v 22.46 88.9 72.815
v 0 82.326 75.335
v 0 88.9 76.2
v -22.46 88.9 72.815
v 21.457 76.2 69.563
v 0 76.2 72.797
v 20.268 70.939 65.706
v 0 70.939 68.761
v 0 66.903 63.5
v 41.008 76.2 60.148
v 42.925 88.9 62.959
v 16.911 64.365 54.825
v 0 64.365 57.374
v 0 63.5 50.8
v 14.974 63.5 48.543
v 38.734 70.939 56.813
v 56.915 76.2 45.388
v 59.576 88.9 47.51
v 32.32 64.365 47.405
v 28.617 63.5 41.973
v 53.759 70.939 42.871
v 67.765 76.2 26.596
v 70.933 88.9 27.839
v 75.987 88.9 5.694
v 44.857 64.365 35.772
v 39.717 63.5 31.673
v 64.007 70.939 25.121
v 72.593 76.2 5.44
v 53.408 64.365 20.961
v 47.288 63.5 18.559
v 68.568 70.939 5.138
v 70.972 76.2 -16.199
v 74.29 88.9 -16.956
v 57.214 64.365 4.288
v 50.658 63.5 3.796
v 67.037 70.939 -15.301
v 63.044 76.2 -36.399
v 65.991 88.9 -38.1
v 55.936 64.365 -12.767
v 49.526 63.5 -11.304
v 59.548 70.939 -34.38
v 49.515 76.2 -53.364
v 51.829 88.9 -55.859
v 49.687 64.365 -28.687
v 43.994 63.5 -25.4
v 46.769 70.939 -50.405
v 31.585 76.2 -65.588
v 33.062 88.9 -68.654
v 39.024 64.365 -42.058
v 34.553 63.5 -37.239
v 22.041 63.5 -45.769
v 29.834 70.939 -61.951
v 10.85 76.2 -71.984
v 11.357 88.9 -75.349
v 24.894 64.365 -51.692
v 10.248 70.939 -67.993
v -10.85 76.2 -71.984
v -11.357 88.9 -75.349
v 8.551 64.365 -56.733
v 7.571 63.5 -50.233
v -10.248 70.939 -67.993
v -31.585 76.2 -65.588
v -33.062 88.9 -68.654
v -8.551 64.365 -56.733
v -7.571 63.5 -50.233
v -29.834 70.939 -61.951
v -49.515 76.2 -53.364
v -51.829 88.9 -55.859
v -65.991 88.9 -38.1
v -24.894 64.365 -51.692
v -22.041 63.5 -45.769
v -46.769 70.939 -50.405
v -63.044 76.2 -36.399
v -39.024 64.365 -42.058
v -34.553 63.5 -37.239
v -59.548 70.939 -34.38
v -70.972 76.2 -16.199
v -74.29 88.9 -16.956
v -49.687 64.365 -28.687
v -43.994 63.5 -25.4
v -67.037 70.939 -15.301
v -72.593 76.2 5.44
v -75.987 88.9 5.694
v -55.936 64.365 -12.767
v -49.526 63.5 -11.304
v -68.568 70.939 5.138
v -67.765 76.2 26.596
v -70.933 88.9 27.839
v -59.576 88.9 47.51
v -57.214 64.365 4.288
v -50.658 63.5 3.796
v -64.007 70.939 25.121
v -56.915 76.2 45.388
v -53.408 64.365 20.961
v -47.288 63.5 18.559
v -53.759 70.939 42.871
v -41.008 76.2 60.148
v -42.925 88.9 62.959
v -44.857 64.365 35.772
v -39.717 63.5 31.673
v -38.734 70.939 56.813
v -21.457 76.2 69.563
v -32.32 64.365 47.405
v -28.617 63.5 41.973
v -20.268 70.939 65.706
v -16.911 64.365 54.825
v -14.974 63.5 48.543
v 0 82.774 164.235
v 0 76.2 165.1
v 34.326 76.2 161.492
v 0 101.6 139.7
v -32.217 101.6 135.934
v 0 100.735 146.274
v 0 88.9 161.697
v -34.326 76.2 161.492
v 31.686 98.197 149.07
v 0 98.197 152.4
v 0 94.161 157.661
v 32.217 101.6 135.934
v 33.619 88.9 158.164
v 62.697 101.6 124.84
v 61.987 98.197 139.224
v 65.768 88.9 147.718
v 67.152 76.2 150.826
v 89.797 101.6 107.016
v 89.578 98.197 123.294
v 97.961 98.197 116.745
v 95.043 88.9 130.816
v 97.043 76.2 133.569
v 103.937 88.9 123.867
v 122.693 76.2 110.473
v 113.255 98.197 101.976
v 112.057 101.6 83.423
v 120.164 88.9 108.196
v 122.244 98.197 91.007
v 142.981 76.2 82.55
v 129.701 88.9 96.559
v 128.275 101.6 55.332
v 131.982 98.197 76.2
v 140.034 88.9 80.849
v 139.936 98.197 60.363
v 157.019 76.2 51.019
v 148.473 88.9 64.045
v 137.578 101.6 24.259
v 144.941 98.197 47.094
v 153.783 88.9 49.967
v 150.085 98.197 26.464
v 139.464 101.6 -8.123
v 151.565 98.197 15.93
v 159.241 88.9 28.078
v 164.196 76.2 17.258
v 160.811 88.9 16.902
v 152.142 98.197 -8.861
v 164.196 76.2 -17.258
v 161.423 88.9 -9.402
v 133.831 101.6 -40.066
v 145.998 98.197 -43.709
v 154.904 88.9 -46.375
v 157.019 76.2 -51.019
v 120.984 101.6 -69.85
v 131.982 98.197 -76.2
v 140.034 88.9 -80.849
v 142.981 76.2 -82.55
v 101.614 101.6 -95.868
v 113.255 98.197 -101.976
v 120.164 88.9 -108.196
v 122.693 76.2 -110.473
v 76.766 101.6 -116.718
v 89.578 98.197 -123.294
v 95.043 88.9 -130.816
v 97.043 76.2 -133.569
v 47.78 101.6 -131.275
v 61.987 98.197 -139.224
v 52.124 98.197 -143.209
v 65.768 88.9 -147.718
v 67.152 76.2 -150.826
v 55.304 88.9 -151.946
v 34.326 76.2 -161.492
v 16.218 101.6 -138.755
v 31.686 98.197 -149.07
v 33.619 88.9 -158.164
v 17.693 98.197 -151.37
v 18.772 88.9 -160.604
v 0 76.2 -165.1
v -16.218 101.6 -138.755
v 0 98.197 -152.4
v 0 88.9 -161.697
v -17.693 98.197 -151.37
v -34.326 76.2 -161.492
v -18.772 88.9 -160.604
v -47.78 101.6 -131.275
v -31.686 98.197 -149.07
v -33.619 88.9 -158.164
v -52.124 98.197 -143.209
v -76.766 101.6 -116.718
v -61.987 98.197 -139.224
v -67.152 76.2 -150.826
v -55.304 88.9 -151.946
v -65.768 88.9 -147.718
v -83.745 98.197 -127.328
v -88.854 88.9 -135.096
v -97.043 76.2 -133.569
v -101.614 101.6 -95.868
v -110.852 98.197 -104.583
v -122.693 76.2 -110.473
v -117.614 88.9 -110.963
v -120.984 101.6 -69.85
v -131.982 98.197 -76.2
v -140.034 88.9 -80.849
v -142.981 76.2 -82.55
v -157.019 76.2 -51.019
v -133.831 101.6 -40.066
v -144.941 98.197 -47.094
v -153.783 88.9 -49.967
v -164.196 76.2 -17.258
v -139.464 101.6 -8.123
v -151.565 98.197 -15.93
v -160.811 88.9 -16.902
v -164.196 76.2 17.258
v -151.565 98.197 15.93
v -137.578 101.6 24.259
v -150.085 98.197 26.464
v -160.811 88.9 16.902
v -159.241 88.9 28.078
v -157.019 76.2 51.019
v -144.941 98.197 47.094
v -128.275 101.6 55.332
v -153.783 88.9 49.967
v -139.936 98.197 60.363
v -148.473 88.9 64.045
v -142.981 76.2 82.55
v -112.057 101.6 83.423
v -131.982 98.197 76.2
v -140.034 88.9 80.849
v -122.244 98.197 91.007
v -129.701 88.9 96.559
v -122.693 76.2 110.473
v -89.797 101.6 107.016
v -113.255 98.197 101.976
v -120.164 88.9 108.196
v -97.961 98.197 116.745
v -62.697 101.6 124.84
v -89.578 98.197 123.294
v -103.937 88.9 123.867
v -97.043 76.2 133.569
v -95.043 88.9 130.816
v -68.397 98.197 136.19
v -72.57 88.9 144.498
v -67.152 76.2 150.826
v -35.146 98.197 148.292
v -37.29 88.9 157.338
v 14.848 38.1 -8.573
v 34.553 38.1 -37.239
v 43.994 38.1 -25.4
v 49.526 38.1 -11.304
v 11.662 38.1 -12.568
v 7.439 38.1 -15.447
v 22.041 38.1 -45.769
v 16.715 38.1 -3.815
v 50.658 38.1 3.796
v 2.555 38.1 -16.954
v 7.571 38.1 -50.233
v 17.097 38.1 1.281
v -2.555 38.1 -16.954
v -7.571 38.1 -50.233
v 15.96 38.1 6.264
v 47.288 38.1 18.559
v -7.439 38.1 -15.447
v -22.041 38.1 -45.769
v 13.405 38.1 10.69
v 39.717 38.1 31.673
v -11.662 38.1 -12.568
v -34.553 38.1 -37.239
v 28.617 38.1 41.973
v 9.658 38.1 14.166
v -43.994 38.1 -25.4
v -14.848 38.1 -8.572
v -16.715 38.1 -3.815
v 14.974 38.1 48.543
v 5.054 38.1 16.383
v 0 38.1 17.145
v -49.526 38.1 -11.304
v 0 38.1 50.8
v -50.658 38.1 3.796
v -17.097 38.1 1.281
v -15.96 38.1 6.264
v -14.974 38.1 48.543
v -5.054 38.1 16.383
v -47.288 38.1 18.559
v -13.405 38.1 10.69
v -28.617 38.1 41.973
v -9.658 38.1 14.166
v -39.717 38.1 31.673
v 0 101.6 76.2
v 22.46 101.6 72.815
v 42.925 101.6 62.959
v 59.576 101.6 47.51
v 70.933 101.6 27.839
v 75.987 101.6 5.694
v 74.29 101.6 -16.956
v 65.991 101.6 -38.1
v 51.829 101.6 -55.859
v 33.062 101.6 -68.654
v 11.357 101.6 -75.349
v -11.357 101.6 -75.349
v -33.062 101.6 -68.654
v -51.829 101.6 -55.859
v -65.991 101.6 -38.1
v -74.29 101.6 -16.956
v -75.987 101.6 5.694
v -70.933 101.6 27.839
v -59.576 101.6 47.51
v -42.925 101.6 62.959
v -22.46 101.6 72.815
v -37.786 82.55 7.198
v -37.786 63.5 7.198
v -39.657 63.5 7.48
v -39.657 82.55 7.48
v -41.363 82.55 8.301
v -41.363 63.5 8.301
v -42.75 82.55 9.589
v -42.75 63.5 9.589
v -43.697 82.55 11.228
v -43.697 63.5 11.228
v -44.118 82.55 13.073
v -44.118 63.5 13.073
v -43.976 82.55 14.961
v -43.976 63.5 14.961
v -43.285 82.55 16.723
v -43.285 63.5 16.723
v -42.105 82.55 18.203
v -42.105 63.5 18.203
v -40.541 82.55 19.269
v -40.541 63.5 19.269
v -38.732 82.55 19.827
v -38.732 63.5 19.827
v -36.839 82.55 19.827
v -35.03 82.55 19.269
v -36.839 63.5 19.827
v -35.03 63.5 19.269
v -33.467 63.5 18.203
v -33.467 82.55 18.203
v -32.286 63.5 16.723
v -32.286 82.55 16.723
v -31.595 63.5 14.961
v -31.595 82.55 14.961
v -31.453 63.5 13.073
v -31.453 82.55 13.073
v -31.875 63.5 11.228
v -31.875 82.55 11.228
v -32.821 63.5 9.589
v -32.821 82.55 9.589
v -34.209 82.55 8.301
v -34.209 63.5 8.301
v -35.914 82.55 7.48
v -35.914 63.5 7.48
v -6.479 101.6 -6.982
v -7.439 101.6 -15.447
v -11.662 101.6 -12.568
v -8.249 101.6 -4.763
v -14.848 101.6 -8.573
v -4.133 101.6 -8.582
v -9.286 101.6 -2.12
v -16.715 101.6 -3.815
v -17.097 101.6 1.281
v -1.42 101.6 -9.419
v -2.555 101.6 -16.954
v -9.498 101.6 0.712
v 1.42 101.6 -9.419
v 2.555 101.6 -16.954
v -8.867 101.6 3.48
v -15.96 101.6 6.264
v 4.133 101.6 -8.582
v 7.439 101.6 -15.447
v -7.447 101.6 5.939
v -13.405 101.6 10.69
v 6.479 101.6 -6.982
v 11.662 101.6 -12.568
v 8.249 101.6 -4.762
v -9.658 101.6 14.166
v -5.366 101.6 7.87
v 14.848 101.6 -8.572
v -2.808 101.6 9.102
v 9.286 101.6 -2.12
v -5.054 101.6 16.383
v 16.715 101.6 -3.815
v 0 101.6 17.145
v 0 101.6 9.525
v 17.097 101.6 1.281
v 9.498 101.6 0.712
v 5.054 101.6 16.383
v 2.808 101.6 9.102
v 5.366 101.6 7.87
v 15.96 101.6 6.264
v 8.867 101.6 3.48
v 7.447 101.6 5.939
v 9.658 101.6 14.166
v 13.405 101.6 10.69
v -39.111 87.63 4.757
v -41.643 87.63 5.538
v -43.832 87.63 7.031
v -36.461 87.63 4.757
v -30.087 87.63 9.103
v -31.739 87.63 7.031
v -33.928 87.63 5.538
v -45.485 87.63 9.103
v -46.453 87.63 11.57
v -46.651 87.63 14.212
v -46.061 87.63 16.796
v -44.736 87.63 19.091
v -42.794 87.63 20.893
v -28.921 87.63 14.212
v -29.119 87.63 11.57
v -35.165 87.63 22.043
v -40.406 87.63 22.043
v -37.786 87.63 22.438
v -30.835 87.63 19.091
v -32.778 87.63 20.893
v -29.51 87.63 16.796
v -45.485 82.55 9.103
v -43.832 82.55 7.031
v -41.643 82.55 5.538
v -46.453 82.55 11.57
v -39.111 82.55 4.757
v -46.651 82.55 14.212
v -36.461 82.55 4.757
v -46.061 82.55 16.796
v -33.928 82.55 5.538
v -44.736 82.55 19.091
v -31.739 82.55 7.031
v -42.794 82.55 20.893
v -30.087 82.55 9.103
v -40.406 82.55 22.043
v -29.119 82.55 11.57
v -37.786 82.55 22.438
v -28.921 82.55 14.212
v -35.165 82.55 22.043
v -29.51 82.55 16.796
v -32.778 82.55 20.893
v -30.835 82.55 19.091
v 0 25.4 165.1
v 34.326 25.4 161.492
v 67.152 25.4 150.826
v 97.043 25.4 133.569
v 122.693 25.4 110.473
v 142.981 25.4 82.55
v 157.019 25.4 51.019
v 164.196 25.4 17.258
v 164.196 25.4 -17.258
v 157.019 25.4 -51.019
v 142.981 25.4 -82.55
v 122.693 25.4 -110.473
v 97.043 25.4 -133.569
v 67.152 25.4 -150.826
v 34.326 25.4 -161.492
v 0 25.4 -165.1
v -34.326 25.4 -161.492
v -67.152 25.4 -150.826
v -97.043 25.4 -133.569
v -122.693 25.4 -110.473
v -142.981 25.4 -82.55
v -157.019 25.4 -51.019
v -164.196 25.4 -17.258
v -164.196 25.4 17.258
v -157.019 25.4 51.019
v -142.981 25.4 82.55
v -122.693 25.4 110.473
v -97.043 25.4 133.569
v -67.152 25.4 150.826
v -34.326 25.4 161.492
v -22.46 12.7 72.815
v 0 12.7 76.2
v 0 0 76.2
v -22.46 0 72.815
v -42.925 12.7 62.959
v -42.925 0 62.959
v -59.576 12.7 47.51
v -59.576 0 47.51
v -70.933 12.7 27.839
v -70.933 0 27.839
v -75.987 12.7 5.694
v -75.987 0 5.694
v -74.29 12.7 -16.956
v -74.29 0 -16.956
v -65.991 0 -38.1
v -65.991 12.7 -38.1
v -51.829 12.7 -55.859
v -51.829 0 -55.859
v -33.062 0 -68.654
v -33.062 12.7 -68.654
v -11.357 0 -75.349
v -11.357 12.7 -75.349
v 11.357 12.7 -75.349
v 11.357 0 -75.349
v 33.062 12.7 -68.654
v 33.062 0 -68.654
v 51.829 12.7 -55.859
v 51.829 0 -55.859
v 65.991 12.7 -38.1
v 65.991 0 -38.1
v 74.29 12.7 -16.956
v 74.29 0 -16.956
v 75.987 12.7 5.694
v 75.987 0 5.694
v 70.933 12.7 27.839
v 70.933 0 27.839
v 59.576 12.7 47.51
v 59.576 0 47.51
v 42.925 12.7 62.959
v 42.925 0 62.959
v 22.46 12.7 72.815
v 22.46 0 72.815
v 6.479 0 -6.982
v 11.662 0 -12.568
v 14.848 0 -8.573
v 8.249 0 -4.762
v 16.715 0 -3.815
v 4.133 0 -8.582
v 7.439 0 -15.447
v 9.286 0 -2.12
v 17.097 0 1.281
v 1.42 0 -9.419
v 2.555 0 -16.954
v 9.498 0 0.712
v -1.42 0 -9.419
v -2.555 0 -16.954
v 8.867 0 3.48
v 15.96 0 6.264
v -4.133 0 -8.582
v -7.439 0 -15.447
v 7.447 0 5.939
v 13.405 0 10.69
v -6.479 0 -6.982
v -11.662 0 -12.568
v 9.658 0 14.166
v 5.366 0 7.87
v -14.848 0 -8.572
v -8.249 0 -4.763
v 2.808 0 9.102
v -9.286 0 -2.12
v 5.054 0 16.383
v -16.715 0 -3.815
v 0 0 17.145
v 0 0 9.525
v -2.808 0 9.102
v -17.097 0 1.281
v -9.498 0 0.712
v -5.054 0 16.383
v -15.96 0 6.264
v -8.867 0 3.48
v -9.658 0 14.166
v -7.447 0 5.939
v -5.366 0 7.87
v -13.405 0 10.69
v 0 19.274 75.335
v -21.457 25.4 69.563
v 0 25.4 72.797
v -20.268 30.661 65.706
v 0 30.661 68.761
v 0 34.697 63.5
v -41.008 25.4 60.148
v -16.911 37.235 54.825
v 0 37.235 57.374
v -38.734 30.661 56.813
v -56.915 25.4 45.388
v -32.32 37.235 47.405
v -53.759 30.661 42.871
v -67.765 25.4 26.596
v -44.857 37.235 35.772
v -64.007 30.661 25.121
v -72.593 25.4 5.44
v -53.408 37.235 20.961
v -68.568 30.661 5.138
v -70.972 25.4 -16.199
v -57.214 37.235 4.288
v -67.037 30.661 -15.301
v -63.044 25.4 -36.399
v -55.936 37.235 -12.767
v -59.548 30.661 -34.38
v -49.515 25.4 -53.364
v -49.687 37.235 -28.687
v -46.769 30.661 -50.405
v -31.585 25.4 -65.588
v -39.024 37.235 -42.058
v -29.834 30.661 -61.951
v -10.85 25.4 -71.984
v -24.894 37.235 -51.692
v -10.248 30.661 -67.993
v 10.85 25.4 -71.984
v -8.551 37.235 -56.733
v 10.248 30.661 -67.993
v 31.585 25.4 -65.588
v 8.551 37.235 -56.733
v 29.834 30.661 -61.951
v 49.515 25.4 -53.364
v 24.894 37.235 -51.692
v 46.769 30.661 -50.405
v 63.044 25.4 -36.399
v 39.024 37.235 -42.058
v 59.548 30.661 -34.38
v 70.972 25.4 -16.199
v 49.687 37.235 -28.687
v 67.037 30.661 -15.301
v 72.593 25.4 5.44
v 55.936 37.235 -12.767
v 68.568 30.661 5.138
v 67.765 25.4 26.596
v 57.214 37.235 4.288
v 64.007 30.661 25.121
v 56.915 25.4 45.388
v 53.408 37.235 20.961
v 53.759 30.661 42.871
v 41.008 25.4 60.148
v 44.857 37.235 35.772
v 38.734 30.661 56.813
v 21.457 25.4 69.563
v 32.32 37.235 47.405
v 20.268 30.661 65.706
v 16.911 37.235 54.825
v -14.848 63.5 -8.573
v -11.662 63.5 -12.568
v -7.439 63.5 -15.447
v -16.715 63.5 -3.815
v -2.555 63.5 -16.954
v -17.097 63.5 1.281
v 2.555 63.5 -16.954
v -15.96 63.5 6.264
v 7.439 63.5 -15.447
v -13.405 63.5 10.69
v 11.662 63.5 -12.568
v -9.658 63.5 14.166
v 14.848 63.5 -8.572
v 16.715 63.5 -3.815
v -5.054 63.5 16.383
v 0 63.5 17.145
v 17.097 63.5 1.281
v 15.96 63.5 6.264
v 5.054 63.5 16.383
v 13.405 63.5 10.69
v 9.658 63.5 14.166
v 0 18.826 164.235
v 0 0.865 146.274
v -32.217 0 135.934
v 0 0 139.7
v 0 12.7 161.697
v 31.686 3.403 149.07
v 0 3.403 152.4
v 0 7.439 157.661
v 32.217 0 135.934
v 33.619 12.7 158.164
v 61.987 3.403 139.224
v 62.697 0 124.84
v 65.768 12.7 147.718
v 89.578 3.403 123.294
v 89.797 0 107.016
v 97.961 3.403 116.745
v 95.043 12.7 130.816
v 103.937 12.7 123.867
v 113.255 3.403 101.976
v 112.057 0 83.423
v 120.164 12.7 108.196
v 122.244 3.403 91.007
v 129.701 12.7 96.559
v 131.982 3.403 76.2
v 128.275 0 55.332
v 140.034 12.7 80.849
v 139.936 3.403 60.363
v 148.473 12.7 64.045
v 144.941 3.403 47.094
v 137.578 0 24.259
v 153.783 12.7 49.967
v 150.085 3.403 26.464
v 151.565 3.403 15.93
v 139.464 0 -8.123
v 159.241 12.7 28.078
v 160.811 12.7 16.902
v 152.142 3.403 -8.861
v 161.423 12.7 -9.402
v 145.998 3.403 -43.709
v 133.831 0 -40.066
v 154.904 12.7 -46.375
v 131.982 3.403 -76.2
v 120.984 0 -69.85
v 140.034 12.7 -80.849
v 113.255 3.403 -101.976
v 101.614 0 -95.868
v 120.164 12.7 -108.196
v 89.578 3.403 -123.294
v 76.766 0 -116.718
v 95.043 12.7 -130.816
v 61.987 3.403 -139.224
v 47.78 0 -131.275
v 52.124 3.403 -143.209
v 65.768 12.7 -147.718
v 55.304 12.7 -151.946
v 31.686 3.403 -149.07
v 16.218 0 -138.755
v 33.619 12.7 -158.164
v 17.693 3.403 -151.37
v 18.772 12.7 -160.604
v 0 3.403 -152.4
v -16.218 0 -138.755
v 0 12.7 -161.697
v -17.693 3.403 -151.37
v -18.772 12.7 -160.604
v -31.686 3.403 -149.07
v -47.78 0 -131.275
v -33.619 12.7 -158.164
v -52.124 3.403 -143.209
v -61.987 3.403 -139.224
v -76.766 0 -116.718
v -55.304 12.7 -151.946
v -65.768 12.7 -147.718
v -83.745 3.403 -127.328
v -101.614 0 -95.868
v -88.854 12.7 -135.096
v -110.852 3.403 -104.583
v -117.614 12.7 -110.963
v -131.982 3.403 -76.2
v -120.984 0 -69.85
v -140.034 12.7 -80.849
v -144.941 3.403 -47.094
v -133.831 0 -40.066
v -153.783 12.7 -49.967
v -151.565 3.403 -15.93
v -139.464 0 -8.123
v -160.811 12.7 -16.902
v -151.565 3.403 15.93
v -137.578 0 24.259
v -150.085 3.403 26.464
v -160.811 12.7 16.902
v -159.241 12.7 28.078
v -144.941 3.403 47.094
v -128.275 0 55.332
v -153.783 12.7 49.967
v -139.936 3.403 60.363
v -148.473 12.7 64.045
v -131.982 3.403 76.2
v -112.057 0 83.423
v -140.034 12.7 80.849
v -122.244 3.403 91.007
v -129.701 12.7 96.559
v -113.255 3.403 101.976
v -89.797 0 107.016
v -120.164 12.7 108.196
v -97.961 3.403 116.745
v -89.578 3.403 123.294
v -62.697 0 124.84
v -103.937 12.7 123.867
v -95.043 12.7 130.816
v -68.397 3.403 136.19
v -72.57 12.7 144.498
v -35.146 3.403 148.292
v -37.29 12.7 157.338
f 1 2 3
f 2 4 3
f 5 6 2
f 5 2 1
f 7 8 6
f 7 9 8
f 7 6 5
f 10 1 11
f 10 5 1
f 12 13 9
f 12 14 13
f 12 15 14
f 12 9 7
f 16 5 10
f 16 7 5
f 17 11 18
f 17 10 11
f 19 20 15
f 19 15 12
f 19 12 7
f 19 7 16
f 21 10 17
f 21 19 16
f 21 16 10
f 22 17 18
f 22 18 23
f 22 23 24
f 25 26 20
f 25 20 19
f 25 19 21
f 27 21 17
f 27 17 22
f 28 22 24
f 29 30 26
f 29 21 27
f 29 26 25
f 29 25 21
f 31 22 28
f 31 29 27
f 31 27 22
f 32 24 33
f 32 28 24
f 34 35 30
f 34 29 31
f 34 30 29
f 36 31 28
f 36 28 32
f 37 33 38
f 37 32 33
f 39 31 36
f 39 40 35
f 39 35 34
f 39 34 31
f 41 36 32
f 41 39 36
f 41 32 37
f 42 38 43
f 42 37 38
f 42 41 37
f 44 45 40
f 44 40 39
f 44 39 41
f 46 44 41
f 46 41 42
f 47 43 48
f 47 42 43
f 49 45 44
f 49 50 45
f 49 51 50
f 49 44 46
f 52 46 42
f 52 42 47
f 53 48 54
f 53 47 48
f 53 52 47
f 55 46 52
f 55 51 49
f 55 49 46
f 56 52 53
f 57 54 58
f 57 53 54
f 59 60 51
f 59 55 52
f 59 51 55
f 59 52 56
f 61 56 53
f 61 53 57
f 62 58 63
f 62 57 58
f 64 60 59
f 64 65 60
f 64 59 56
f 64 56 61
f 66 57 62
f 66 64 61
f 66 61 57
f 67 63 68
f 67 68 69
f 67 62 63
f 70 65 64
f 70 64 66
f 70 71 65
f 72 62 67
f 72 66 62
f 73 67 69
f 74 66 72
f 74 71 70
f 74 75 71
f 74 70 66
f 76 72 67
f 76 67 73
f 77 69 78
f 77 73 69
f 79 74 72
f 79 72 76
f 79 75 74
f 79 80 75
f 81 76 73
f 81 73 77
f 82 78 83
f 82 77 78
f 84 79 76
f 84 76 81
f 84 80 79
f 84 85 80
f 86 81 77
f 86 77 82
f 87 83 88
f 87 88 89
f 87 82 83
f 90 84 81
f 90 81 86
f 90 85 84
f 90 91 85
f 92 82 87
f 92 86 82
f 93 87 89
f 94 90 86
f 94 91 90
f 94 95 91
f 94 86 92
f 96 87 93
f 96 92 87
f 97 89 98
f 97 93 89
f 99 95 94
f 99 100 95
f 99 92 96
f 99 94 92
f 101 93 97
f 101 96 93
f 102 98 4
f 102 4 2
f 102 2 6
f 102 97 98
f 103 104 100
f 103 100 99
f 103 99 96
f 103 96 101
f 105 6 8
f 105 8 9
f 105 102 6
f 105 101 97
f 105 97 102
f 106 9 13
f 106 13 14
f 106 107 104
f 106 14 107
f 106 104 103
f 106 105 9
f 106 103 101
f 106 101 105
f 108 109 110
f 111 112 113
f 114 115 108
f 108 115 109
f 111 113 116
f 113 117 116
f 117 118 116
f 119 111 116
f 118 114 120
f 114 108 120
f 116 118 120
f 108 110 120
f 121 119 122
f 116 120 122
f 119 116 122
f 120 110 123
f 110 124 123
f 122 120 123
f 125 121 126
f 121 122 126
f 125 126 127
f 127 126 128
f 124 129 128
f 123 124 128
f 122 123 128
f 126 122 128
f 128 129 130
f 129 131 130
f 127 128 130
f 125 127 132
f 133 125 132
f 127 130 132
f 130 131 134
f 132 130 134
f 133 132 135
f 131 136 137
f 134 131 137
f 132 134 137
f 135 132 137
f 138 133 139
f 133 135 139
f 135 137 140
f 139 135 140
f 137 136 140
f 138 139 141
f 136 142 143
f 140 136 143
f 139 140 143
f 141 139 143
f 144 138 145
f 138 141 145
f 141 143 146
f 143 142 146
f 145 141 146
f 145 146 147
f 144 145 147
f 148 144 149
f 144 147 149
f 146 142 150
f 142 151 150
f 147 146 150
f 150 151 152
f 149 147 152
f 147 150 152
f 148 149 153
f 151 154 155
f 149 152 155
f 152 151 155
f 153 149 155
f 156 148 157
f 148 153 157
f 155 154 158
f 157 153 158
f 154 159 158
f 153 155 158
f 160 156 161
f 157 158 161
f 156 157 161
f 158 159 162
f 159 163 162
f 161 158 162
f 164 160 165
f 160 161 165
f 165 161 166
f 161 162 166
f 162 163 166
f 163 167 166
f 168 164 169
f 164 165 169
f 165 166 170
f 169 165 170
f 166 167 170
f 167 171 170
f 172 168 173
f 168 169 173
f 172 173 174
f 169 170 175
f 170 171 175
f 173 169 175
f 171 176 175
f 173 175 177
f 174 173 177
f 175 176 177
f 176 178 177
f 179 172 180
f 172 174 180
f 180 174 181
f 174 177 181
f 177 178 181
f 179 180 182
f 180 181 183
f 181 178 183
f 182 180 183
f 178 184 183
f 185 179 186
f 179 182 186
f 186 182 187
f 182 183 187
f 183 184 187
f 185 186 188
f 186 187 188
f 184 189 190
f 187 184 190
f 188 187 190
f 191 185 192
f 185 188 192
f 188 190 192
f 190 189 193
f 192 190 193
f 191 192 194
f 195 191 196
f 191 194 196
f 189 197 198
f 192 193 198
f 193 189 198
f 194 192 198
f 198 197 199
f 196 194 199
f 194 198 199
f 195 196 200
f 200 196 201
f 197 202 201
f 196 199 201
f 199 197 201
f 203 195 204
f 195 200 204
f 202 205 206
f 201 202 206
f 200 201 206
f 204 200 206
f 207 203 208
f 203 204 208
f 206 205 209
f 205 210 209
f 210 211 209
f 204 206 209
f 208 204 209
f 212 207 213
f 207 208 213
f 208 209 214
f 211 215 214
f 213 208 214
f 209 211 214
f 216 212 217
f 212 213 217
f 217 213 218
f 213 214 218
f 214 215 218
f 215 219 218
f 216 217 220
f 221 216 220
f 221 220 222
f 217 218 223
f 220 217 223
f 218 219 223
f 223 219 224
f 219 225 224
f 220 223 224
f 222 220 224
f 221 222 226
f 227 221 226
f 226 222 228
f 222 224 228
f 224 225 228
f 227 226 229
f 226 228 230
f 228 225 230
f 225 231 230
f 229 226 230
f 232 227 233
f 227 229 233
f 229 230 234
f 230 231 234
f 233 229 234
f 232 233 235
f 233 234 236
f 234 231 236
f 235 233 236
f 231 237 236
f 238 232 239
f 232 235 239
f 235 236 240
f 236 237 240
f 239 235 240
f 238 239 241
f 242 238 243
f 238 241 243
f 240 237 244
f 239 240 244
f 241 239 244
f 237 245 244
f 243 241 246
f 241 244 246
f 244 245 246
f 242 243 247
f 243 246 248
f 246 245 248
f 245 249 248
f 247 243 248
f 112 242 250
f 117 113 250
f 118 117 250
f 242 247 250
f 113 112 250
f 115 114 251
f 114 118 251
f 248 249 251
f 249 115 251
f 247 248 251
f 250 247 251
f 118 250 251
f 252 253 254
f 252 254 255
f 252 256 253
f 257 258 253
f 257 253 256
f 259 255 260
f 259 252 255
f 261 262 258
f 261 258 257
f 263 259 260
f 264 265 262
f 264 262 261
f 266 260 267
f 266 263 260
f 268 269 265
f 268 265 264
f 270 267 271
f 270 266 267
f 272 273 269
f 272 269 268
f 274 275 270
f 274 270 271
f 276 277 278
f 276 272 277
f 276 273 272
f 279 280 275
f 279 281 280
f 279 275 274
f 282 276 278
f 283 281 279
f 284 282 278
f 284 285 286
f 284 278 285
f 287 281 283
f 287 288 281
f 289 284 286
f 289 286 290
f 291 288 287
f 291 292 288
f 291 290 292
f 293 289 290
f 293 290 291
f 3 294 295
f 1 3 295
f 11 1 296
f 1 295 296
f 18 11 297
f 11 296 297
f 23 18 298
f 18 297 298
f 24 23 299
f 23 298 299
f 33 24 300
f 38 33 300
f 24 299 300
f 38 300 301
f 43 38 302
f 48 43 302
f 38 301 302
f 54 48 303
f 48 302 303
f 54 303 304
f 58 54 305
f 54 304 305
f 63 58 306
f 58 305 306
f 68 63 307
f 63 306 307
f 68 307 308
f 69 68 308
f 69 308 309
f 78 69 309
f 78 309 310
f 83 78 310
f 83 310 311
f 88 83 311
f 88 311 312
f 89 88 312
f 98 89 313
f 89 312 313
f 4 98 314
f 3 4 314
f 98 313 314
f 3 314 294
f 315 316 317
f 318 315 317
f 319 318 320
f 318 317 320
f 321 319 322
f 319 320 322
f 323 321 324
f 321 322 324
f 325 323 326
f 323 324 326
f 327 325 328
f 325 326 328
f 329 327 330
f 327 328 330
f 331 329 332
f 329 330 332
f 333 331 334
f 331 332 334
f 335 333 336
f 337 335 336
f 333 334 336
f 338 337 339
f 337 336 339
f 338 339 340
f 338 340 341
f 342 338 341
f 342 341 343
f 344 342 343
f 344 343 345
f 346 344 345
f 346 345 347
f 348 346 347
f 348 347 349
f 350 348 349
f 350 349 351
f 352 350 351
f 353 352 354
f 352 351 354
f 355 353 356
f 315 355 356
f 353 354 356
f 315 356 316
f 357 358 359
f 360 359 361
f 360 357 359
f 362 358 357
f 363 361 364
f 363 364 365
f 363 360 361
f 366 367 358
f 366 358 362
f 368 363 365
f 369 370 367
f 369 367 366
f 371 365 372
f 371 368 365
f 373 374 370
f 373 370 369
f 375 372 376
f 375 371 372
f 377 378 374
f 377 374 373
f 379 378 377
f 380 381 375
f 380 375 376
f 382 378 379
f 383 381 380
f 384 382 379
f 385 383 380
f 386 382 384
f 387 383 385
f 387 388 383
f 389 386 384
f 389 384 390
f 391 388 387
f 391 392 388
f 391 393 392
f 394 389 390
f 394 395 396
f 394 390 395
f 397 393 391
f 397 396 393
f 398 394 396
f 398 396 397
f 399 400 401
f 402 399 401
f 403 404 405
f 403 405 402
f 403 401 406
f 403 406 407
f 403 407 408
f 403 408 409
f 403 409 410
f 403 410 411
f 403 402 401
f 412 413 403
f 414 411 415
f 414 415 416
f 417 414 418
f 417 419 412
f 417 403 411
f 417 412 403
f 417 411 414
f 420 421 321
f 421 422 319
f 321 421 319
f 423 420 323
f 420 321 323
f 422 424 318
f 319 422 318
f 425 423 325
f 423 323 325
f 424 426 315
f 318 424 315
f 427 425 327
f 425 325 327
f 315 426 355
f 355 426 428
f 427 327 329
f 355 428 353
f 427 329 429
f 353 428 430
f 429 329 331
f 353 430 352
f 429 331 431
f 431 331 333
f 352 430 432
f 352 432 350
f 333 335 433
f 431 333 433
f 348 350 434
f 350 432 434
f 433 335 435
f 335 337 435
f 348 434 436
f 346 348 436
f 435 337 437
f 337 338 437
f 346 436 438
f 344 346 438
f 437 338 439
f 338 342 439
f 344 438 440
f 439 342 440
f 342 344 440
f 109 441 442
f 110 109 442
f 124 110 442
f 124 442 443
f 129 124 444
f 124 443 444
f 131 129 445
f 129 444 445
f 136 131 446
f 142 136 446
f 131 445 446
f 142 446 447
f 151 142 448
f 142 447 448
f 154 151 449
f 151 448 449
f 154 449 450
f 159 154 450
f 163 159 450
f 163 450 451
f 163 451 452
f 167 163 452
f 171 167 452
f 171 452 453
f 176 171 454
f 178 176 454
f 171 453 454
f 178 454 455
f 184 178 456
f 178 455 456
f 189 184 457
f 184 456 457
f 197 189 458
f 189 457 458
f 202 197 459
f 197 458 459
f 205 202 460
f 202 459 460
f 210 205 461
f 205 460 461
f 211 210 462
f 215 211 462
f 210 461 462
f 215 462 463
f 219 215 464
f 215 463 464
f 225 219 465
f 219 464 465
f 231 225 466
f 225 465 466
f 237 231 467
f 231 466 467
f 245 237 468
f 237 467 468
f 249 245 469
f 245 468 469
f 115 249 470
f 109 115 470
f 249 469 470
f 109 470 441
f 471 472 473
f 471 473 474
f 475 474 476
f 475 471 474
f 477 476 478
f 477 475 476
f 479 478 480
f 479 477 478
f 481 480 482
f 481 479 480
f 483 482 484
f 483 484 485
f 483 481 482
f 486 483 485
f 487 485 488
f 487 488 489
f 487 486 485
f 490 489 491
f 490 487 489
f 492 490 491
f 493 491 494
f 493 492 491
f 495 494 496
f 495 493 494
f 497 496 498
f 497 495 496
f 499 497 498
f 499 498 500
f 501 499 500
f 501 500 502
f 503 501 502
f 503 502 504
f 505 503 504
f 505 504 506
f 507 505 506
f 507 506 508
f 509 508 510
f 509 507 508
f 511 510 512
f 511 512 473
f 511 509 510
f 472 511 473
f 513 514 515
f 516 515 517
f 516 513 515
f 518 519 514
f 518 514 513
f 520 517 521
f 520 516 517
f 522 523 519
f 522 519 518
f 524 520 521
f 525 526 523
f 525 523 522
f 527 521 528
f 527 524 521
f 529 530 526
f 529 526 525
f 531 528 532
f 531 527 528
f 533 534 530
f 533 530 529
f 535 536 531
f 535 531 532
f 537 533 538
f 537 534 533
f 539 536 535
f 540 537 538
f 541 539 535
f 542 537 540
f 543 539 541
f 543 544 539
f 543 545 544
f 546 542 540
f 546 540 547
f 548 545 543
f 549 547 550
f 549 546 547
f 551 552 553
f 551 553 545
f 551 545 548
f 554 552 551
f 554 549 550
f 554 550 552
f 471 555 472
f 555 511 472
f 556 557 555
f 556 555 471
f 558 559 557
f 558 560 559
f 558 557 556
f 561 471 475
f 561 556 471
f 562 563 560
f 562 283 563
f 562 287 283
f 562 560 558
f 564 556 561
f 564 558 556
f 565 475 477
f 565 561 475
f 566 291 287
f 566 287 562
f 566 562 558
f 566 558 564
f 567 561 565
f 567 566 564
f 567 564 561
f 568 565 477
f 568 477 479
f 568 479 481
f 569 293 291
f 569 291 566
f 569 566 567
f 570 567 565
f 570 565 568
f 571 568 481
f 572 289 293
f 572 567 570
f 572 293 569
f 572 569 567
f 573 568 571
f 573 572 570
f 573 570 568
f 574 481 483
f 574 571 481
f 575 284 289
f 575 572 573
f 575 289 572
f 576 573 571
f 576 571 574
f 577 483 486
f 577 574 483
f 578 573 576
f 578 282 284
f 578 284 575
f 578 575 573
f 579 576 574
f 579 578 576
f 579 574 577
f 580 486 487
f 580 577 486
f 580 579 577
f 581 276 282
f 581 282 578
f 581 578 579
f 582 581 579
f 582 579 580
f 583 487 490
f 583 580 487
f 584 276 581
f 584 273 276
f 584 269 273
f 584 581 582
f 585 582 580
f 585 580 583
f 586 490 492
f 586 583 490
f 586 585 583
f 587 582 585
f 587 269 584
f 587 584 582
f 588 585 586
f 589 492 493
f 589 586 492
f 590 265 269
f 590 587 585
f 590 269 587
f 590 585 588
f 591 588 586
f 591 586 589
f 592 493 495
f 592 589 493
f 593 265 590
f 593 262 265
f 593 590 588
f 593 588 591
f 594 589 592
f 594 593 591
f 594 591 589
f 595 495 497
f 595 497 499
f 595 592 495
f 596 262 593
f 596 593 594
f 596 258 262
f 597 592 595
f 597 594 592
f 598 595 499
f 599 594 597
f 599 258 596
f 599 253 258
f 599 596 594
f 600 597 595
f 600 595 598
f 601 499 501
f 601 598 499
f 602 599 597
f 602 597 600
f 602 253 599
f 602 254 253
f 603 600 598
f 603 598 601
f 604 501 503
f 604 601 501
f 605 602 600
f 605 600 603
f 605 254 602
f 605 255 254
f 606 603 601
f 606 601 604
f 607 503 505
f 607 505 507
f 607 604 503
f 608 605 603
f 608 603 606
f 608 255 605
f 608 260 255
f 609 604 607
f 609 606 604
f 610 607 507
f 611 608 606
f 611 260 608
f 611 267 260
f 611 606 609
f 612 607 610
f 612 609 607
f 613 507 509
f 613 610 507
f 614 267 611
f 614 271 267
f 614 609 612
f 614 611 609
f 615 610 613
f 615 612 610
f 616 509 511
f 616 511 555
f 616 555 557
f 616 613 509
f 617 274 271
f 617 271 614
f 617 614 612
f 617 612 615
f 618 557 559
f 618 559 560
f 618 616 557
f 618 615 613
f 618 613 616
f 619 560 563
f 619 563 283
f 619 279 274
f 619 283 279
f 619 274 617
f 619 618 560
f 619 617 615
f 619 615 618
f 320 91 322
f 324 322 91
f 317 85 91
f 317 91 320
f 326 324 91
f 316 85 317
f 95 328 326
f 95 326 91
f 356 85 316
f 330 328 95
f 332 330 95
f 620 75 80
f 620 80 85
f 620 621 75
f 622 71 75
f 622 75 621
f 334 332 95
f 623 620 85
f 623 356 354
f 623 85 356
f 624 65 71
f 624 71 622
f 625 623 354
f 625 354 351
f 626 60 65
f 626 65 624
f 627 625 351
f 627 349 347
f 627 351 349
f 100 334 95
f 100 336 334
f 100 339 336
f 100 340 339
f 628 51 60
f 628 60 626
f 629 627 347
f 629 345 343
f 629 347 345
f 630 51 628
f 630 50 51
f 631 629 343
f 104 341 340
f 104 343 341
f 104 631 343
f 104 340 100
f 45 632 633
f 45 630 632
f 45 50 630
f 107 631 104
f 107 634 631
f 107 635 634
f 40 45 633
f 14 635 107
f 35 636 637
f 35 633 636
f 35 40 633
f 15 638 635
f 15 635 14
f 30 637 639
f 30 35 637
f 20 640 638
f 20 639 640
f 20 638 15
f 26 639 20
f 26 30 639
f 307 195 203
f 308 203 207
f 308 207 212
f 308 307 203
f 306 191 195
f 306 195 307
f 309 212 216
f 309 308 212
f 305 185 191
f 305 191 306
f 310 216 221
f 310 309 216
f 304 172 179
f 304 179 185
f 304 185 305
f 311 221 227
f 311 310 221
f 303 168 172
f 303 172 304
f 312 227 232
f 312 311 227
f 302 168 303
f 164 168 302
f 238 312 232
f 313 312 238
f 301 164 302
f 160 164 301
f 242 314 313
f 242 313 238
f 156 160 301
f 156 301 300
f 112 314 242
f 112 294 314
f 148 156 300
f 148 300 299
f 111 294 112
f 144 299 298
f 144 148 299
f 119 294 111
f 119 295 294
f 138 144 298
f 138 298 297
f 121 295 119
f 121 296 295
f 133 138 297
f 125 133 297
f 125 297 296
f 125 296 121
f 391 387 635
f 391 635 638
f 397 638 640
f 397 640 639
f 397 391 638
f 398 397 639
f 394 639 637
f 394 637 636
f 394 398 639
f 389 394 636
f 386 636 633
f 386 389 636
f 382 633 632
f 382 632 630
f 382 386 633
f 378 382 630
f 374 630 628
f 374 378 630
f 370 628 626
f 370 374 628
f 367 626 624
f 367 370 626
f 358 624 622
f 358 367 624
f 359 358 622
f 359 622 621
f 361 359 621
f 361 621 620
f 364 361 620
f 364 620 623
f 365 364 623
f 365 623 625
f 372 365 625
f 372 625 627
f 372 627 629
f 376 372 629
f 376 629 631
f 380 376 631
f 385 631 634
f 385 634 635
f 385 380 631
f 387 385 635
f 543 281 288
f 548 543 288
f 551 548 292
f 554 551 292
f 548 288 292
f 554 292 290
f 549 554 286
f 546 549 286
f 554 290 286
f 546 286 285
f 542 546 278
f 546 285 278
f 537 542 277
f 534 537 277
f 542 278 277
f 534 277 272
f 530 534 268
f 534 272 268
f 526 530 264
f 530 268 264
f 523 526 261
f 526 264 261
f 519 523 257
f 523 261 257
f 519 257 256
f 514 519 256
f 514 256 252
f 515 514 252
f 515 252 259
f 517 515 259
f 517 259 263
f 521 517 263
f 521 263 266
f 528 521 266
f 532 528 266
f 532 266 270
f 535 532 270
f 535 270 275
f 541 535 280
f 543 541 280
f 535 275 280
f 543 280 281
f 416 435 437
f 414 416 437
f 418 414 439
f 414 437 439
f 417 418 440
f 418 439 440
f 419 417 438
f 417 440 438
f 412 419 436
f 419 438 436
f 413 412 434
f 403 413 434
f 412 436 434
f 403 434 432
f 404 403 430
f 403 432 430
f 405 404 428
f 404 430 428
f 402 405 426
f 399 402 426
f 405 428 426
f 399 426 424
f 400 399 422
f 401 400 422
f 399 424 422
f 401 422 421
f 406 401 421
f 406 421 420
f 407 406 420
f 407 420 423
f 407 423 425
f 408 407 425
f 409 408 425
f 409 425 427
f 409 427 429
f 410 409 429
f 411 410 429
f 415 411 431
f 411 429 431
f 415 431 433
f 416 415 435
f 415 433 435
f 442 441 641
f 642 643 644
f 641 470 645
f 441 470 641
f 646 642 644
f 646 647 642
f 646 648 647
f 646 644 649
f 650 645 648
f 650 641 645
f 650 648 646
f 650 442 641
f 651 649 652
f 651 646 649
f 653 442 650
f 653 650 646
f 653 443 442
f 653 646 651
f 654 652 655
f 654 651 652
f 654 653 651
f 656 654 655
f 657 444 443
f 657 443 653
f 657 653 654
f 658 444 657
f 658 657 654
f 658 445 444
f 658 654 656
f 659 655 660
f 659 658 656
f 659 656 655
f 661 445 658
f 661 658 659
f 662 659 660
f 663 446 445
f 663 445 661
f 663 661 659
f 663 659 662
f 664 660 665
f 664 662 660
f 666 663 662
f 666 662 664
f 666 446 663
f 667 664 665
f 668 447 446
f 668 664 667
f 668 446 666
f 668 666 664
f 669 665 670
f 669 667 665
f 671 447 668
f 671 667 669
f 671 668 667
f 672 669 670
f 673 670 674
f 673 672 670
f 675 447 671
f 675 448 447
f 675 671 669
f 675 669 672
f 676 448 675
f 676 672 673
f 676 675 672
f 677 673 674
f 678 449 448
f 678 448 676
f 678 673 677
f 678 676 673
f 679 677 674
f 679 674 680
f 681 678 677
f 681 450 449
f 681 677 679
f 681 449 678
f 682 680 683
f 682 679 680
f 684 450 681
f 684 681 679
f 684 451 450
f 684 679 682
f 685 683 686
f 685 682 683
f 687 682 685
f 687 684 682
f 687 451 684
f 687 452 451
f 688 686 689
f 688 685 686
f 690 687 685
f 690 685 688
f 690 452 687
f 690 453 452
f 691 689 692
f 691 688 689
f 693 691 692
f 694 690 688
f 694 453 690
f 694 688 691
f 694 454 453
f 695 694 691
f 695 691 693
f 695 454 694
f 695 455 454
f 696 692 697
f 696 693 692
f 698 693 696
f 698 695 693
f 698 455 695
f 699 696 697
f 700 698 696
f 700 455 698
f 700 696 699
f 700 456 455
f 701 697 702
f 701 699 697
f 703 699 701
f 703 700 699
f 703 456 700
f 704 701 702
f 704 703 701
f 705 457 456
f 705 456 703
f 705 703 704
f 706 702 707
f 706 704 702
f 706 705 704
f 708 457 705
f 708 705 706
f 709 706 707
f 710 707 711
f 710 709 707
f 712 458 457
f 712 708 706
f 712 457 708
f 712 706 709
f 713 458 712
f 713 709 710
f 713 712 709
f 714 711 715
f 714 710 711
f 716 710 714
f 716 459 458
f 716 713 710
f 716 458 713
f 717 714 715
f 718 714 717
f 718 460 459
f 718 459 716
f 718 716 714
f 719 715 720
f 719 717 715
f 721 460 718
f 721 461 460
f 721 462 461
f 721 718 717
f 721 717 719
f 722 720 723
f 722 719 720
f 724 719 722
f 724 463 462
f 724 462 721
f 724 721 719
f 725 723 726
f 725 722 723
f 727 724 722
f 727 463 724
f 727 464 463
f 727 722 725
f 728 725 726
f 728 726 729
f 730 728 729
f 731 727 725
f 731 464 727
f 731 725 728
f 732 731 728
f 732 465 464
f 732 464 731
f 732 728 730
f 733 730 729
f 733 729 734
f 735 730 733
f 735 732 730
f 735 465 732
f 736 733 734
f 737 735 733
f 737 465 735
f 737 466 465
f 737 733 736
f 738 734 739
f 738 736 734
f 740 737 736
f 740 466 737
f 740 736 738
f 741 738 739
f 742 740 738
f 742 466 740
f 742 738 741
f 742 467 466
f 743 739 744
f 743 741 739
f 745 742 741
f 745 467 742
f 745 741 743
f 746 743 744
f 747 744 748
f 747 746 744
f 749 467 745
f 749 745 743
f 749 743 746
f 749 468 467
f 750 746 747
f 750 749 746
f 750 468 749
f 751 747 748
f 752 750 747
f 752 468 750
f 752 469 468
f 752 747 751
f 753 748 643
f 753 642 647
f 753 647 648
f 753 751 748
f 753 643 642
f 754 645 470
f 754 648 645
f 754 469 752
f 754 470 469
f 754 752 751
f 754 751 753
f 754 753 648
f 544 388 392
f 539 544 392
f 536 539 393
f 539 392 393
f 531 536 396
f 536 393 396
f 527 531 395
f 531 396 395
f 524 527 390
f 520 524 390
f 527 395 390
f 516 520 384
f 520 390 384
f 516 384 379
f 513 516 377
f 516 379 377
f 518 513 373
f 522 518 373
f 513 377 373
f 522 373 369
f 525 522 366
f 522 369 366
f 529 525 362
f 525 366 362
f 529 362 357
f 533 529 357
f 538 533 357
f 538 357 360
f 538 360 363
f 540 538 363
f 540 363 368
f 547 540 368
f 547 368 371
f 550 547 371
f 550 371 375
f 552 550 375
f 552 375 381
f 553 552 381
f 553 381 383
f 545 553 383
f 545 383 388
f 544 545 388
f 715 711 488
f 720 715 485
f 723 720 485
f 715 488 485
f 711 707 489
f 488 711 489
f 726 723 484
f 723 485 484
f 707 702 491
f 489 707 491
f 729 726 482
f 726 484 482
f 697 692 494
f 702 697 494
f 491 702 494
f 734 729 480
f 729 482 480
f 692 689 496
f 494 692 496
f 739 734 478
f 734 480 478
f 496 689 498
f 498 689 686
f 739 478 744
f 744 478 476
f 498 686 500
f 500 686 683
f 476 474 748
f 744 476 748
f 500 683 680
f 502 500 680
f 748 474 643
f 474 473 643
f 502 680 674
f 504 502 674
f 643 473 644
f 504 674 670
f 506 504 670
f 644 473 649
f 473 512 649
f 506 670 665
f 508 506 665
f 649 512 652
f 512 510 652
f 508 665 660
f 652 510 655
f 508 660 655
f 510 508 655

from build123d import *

# Parameters (mm, degrees)
SKETCH1_R           = 165.1
BOSS_EXTRUDE2_DEPTH = 101.6
SKETCH2_R           = 76.2
CUT_EXTRUDE1_DEPTH  = 38.1
FILLET3_R           = 25.4
FILLET4_R           = 25.4
CUT_EXTRUDE2_START  = -38.1
SKETCH3_R           = 76.2
CUT_EXTRUDE2_DEPTH  = 38.1
FILLET5_R           = 25.4
FILLET6_R           = 25.4
SKETCH4_R           = 17.145
BOSS_EXTRUDE3_DEPTH = 38.1
BOSS_EXTRUDE4_START = 38.1
SKETCH5_R           = 17.145
BOSS_EXTRUDE4_DEPTH = 38.1
SKETCH6_R           = 9.525
CUT_EXTRUDE3_DEPTH  = 255.634208358
SKETCH7_R           = 6.35
BOSS_EXTRUDE5_DEPTH = 19.05
SKETCH8_R           = 8.89
BOSS_EXTRUDE6_DEPTH = 5.08


with BuildPart() as part:
    # Sketch1 → Boss-Extrude2 (new body)
    with BuildSketch(Plane(origin=(0, 0, 0), x_dir=(1, 0, 0), z_dir=(0, 1, 0))):
        with Locations(Location((0, 0, 0), (0, 0, 270))):
            Circle(SKETCH1_R)
    extrude(amount=BOSS_EXTRUDE2_DEPTH)

    # Sketch2 → Cut-Extrude1 (cut)
    with BuildSketch(Plane(origin=(0, 101.6, 0), x_dir=(1, 0, 0), z_dir=(0, 1, 0))):
        with Locations(Location((0, 0, 0), (0, 0, 270))):
            Circle(SKETCH2_R)
    extrude(amount=-CUT_EXTRUDE1_DEPTH, mode=Mode.SUBTRACT)

    # Fillet3
    fillet3_edges = [part.edges().sort_by_distance(p)[0] for p in [
        (0, 63.5, -76.2),
    ]]
    fillet(fillet3_edges, radius=FILLET3_R)

    # Fillet4
    fillet4_edges = [part.edges().sort_by_distance(p)[0] for p in [
        (0, 101.6, -165.1),
    ]]
    fillet(fillet4_edges, radius=FILLET4_R)

    # Sketch3 → Cut-Extrude2 (cut)
    with BuildSketch(Plane(origin=(0, 0, 0), x_dir=(-1, 0, 0), z_dir=(0, -1, 0)).offset(CUT_EXTRUDE2_START)):
        with Locations(Location((0, 0, 0), (0, 0, 270))):
            Circle(SKETCH3_R)
    extrude(amount=CUT_EXTRUDE2_DEPTH, mode=Mode.SUBTRACT)

    # Fillet5
    fillet5_edges = [part.edges().sort_by_distance(p)[0] for p in [
        (0, 38.1, -76.2),
    ]]
    fillet(fillet5_edges, radius=FILLET5_R)

    # Fillet6
    fillet6_edges = [part.edges().sort_by_distance(p)[0] for p in [
        (0, 0, -165.1),
    ]]
    fillet(fillet6_edges, radius=FILLET6_R)

    # Sketch4 → Boss-Extrude3 (add)
    with BuildSketch(Plane(origin=(0, 38.1, 0), x_dir=(-1, 0, 0), z_dir=(0, -1, 0))):
        with Locations(Location((0, 0, 0), (0, 0, 270))):
            Circle(SKETCH4_R)
    extrude(amount=BOSS_EXTRUDE3_DEPTH)

    # Sketch5 → Boss-Extrude4 (add)
    with BuildSketch(Plane(origin=(0, 63.5, 0), x_dir=(1, 0, 0), z_dir=(0, 1, 0)).offset(BOSS_EXTRUDE4_START)):
        with Locations(Location((0, 0, 0), (0, 0, 270))):
            Circle(SKETCH5_R)
    extrude(amount=-BOSS_EXTRUDE4_DEPTH)

    # Sketch6 → Cut-Extrude3 (cut, through all)
    with BuildSketch(Plane(origin=(0, 101.6, 0), x_dir=(1, 0, 0), z_dir=(0, 1, 0))):
        with Locations(Location((0, 0, 0), (0, 0, 270))):
            Circle(SKETCH6_R)
    extrude(amount=-CUT_EXTRUDE3_DEPTH, mode=Mode.SUBTRACT)

    # Sketch7 → Boss-Extrude5 (add)
    with BuildSketch(Plane(origin=(0, 63.5, 0), x_dir=(1, 0, 0), z_dir=(0, 1, 0))):
        with Locations(Location((-37.785648207, -13.547919649, 0), (0, 0, 90))):
            Circle(SKETCH7_R)
    extrude(amount=BOSS_EXTRUDE5_DEPTH)

    # Sketch8 → Boss-Extrude6 (add)
    with BuildSketch(Plane(origin=(0, 82.55, 0), x_dir=(1, 0, 0), z_dir=(0, 1, 0))):
        with Locations(Location((-37.785648207, -13.547919649, 0), (0, 0, 270))):
            Circle(SKETCH8_R)
    extrude(amount=BOSS_EXTRUDE6_DEPTH)


solid = part.part
